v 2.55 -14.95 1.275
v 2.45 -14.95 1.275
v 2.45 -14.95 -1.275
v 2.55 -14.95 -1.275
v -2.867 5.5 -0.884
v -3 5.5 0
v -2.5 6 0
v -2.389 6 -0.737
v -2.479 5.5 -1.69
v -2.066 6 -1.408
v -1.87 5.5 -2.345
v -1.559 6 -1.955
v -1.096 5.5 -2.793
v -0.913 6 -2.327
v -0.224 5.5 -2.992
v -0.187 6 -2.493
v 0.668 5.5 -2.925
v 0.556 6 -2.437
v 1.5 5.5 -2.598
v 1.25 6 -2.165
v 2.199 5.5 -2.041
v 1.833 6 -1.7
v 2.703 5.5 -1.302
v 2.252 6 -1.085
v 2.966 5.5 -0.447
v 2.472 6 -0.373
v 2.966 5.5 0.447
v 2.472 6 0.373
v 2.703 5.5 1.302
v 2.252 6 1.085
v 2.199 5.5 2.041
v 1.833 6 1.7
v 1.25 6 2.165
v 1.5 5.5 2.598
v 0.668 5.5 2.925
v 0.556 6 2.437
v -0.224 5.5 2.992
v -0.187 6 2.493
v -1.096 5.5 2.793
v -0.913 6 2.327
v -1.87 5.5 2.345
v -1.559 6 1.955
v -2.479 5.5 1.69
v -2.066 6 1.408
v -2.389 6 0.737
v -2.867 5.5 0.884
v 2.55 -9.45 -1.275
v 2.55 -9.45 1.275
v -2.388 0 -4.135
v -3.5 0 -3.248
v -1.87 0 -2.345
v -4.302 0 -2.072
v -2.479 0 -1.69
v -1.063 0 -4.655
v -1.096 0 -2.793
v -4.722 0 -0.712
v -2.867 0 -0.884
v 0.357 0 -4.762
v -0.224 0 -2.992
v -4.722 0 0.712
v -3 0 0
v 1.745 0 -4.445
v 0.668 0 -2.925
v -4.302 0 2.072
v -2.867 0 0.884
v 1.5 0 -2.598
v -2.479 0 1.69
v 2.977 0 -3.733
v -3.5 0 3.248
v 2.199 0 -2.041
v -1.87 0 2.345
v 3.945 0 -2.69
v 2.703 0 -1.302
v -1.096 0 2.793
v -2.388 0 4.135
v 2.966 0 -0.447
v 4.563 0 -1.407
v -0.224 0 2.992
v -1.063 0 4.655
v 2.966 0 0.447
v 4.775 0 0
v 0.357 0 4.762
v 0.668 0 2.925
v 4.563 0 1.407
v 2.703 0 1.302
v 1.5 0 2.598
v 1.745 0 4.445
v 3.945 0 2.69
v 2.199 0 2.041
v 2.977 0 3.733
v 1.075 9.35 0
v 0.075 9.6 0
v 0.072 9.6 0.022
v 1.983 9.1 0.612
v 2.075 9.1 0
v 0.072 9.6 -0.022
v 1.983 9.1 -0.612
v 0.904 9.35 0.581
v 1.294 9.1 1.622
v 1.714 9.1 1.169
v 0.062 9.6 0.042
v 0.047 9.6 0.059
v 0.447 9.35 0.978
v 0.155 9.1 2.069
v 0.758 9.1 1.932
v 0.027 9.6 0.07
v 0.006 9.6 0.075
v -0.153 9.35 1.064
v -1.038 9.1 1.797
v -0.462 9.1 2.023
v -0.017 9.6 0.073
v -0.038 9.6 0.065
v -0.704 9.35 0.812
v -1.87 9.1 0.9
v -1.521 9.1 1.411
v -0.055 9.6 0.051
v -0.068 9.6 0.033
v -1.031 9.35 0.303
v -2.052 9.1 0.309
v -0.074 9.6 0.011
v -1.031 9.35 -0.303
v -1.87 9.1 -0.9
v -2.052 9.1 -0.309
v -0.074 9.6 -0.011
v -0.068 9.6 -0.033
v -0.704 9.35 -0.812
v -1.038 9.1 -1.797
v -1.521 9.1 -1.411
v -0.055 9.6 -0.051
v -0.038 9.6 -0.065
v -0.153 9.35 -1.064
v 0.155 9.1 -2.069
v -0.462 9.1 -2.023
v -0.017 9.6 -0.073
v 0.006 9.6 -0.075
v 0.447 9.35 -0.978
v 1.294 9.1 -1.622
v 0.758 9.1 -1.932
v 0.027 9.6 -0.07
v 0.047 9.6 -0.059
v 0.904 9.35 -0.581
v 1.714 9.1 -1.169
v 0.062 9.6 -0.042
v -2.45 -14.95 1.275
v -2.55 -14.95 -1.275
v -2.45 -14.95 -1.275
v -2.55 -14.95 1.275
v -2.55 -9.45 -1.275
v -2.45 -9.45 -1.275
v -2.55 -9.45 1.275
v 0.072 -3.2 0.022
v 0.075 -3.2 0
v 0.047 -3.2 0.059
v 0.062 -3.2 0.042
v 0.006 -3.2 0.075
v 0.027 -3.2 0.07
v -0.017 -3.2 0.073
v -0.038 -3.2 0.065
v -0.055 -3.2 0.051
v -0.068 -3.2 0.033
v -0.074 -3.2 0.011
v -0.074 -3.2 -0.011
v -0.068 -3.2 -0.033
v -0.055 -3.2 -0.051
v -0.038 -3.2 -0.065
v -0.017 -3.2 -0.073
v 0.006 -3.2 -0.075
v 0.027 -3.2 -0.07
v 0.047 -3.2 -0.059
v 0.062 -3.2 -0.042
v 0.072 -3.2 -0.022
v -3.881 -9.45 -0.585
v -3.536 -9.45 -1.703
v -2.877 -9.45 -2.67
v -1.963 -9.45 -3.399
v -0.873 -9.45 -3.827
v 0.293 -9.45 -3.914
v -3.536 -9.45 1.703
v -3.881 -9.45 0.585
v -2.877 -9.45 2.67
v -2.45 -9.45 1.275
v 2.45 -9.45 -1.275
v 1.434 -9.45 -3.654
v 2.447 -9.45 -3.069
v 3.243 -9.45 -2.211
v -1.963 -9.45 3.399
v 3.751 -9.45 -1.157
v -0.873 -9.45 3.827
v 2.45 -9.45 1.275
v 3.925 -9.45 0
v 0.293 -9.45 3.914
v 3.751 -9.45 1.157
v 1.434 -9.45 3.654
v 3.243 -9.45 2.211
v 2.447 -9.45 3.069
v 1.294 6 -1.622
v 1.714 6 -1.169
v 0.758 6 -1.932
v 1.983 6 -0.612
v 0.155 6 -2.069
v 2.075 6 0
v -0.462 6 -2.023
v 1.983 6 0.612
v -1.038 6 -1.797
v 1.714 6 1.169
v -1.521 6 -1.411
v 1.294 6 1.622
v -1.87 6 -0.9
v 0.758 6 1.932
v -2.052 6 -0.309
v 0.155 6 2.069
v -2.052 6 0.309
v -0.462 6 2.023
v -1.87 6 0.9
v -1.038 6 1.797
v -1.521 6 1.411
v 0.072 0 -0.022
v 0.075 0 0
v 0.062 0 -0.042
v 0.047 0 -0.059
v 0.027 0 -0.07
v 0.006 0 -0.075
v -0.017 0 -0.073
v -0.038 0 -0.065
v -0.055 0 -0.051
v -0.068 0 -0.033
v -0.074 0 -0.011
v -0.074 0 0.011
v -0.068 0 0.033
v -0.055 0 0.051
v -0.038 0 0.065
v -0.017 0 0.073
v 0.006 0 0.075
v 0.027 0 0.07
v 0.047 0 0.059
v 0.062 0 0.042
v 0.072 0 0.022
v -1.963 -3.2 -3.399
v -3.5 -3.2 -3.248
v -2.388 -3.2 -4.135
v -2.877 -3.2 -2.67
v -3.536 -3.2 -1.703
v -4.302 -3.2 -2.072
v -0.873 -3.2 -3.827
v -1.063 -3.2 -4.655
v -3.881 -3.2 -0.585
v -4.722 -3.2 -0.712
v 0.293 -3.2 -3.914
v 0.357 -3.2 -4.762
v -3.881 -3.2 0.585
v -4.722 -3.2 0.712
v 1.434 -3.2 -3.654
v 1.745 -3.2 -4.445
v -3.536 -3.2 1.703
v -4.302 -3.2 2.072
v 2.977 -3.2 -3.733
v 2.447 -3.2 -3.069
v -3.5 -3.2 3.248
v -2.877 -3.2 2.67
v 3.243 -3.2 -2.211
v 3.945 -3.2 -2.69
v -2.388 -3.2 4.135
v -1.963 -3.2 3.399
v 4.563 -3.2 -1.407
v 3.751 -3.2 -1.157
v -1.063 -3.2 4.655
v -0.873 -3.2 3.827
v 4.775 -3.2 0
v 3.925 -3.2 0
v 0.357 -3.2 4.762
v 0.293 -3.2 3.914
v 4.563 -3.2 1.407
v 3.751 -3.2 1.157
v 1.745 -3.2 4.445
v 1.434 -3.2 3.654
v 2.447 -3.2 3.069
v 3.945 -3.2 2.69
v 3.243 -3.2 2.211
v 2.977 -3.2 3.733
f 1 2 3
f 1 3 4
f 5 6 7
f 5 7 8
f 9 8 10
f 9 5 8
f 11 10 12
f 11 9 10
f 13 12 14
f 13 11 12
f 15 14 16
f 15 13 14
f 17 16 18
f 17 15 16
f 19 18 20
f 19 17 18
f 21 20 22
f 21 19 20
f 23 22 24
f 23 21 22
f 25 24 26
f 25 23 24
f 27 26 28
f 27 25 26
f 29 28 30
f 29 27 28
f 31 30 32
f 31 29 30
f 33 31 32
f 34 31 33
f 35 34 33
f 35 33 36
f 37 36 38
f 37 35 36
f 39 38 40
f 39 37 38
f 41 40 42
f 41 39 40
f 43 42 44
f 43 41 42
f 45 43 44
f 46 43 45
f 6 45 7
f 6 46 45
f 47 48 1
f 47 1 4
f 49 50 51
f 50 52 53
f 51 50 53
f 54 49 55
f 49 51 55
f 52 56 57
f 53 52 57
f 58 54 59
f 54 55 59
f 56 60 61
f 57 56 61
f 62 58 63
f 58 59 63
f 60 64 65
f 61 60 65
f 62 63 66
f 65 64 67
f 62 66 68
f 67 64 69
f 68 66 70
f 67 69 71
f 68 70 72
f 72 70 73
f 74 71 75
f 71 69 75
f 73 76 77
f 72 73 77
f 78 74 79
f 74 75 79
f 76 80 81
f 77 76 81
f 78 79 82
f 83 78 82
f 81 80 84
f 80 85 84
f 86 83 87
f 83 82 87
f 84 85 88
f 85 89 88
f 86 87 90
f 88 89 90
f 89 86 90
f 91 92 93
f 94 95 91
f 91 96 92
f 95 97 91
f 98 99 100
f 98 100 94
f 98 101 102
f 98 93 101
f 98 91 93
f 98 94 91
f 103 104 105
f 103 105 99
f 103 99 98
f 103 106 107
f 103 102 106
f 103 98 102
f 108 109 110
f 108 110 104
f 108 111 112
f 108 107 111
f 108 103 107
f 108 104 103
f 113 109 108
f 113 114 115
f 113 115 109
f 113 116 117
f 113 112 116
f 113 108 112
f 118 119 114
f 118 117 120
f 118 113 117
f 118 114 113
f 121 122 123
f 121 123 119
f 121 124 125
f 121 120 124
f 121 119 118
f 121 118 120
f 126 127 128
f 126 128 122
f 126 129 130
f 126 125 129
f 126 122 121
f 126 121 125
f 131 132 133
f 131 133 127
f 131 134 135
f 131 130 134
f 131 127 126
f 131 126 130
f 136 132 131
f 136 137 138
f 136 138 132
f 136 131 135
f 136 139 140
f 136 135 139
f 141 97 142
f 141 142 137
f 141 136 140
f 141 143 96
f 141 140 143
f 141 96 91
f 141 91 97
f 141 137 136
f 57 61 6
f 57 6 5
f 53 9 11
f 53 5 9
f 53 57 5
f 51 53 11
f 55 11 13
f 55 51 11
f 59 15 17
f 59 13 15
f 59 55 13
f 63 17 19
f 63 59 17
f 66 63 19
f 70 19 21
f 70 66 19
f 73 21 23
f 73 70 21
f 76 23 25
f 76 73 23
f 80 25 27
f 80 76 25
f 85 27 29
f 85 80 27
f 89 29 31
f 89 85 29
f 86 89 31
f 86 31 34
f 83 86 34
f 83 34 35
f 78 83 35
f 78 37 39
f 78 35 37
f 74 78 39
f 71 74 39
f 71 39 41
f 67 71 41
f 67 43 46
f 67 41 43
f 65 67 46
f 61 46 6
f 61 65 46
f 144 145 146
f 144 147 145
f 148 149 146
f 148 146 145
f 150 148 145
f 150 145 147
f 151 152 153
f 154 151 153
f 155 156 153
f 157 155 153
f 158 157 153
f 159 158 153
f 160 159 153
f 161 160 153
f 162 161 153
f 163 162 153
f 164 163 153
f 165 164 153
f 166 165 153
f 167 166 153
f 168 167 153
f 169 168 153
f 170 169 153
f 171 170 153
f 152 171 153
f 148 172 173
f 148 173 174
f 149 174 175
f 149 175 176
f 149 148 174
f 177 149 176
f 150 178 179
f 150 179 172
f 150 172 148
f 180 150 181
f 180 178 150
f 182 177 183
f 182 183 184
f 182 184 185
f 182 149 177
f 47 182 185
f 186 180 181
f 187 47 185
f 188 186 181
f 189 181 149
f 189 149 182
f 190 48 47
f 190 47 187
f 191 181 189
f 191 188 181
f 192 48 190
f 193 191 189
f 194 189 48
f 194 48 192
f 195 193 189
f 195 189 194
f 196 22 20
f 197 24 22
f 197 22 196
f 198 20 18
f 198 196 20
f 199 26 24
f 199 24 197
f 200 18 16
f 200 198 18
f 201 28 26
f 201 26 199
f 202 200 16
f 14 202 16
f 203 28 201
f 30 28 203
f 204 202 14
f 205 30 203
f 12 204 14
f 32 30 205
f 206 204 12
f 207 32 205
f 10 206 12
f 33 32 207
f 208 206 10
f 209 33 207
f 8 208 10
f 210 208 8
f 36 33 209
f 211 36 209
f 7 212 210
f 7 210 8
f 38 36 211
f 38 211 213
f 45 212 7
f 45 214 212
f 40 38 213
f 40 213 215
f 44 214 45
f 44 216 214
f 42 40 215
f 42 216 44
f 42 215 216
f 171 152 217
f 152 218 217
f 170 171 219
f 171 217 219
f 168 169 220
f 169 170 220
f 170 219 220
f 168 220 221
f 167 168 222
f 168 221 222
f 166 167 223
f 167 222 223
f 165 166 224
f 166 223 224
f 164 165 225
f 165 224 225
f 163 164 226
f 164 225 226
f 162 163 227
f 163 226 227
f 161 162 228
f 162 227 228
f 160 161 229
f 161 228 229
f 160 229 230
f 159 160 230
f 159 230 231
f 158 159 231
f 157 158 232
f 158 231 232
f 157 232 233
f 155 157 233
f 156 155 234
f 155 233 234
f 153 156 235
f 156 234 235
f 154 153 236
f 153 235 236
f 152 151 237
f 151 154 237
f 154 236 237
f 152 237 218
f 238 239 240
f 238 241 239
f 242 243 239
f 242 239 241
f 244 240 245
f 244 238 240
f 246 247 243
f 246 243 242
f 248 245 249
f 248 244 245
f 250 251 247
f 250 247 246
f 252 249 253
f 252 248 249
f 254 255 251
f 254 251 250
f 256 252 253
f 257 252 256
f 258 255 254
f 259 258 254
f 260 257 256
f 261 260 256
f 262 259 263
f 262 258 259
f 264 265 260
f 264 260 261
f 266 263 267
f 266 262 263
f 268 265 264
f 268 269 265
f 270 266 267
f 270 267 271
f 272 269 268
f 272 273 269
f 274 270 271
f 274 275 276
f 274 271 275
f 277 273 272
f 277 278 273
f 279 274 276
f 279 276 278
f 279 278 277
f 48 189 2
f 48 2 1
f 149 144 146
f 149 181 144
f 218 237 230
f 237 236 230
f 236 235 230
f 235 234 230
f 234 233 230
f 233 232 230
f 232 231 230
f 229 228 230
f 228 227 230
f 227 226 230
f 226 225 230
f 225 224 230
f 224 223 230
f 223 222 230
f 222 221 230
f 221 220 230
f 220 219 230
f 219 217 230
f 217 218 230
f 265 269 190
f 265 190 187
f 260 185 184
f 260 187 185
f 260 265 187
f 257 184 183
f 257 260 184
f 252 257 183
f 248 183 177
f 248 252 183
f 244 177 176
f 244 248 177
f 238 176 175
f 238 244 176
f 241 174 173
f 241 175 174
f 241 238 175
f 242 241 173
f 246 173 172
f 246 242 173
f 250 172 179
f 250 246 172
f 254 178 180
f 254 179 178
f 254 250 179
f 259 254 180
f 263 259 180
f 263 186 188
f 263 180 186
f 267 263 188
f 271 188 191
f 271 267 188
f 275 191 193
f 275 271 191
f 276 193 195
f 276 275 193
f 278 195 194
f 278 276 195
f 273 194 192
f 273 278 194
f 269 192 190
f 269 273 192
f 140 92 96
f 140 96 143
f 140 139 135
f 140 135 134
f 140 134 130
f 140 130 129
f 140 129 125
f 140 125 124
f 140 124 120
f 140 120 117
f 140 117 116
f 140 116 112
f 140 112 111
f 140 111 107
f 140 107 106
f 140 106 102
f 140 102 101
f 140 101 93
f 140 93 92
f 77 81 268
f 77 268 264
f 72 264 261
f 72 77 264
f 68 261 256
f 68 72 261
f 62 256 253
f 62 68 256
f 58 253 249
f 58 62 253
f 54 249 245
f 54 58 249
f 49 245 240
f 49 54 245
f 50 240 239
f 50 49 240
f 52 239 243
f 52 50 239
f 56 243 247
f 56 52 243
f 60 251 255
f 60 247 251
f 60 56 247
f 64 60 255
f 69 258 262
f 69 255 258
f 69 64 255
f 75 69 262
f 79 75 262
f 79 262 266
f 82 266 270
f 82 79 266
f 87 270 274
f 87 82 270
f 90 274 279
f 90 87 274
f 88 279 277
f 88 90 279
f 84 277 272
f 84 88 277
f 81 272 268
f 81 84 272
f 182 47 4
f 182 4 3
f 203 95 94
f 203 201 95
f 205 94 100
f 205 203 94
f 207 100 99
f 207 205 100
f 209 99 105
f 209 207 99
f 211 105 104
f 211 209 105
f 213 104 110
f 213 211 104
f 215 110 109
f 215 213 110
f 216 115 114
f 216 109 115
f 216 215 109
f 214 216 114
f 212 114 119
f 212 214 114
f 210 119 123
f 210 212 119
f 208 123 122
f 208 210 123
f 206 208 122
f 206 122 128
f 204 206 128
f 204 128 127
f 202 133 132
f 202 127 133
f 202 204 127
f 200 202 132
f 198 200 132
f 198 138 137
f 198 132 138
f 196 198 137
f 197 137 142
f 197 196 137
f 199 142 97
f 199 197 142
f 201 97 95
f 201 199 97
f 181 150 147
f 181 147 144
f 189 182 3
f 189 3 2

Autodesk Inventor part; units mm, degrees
ref_plane "YZ Plane" through (0, 0, 0) normal (1, 0, 0) x (0, 1, 0)
ref_plane "XZ Plane" through (0, 0, 0) normal (0, 1, 0) x (-1, 0, 0)
ref_plane "XY Plane" through (0, 0, 0) normal (0, 0, 1) x (1, 0, 0)
sketch "Boceto1" plane through (0, 0, 0) normal (0, 1, 0) x (-1, 0, 0)
  circle A0 centre (0, 0) radius 3
  dimension "d0" = 6
extrude "Extrusión1" add sketch "Boceto1" along normal blind 6
sketch "Boceto2" plane through (0, 6, 0) normal (0, 1, 0) x (1, 0, 0)
  circle A0 centre (0, 0) radius 2.075
  dimension "d3" = 4.15
extrude "Extrusión2" add sketch "Boceto2" along normal blind 3.6
chamfer "Chaflán1" distance 2 distance2 0.5 1 edges at (-2.075, 9.6, 0) measured on face at (0.6845, 9.6, -0.4587)
sketch "Boceto3" plane through (0, 0, 0) normal (0, -1, 0) x (1, 0, 0)
  circle A0 centre (0, 0) radius 0.075 projected
  circle A1 centre (0, 0) radius 4.775
  dimension "d9" = 9.55
extrude "Extrusión3" add sketch "Boceto3" along normal blind 3.2
sketch "Boceto4" plane through (0, -3.2, 0) normal (0, -1, 0) x (1, 0, 0)
  circle A0 centre (0, 0) radius 3.925
  dimension "d12" = 7.85
extrude "Extrusión4" add sketch "Boceto4" along normal blind 6.25
thread "Rosca1" size "M6x1" class "6g" standard "ANSI Metric M Profile" length 6.2
chamfer "Chaflán2" distance 0.5 angle 45 1 edges at (3, 6, 0)
sketch "Boceto5" plane through (0, -9.45, 0) normal (0, -1, 0) x (1, 0, 0)
  circle A0 centre (0, 0) radius 0.075 projected
  line L0 (0, 0) -> (2.5, 0)
  line L1 (0, 0) -> (-2.5, 0)
  line L2 (2.45, 1.275) -> (2.55, 1.275)
  line L3 (2.55, 1.275) -> (2.55, -1.275)
  line L4 (2.55, -1.275) -> (2.45, -1.275)
  line L5 (2.45, -1.275) -> (2.45, 1.275)
  line L6 (2.45, 1.275) -> (2.55, -1.275) construction
  line L7 (2.55, 1.275) -> (2.45, -1.275) construction
  line L8 (-2.55, 1.275) -> (-2.45, 1.275)
  line L9 (-2.45, 1.275) -> (-2.45, -1.275)
  line L10 (-2.45, -1.275) -> (-2.55, -1.275)
  line L11 (-2.55, -1.275) -> (-2.55, 1.275)
  line L12 (-2.55, 1.275) -> (-2.45, -1.275) construction
  line L13 (-2.45, 1.275) -> (-2.55, -1.275) construction
  dimension "d20" = 2.5
  dimension "d21" = 2.5
  dimension "d22" = 0.1
  dimension "d23" = 2.55
  dimension "d24" = 0.1
extrude "Extrusión5" add sketch "Boceto5" along normal blind 5.5 contours L9 L10 L11 L8 | L5 L2 L3 L4
properties part number "Interruptor_BlueRobotics"
